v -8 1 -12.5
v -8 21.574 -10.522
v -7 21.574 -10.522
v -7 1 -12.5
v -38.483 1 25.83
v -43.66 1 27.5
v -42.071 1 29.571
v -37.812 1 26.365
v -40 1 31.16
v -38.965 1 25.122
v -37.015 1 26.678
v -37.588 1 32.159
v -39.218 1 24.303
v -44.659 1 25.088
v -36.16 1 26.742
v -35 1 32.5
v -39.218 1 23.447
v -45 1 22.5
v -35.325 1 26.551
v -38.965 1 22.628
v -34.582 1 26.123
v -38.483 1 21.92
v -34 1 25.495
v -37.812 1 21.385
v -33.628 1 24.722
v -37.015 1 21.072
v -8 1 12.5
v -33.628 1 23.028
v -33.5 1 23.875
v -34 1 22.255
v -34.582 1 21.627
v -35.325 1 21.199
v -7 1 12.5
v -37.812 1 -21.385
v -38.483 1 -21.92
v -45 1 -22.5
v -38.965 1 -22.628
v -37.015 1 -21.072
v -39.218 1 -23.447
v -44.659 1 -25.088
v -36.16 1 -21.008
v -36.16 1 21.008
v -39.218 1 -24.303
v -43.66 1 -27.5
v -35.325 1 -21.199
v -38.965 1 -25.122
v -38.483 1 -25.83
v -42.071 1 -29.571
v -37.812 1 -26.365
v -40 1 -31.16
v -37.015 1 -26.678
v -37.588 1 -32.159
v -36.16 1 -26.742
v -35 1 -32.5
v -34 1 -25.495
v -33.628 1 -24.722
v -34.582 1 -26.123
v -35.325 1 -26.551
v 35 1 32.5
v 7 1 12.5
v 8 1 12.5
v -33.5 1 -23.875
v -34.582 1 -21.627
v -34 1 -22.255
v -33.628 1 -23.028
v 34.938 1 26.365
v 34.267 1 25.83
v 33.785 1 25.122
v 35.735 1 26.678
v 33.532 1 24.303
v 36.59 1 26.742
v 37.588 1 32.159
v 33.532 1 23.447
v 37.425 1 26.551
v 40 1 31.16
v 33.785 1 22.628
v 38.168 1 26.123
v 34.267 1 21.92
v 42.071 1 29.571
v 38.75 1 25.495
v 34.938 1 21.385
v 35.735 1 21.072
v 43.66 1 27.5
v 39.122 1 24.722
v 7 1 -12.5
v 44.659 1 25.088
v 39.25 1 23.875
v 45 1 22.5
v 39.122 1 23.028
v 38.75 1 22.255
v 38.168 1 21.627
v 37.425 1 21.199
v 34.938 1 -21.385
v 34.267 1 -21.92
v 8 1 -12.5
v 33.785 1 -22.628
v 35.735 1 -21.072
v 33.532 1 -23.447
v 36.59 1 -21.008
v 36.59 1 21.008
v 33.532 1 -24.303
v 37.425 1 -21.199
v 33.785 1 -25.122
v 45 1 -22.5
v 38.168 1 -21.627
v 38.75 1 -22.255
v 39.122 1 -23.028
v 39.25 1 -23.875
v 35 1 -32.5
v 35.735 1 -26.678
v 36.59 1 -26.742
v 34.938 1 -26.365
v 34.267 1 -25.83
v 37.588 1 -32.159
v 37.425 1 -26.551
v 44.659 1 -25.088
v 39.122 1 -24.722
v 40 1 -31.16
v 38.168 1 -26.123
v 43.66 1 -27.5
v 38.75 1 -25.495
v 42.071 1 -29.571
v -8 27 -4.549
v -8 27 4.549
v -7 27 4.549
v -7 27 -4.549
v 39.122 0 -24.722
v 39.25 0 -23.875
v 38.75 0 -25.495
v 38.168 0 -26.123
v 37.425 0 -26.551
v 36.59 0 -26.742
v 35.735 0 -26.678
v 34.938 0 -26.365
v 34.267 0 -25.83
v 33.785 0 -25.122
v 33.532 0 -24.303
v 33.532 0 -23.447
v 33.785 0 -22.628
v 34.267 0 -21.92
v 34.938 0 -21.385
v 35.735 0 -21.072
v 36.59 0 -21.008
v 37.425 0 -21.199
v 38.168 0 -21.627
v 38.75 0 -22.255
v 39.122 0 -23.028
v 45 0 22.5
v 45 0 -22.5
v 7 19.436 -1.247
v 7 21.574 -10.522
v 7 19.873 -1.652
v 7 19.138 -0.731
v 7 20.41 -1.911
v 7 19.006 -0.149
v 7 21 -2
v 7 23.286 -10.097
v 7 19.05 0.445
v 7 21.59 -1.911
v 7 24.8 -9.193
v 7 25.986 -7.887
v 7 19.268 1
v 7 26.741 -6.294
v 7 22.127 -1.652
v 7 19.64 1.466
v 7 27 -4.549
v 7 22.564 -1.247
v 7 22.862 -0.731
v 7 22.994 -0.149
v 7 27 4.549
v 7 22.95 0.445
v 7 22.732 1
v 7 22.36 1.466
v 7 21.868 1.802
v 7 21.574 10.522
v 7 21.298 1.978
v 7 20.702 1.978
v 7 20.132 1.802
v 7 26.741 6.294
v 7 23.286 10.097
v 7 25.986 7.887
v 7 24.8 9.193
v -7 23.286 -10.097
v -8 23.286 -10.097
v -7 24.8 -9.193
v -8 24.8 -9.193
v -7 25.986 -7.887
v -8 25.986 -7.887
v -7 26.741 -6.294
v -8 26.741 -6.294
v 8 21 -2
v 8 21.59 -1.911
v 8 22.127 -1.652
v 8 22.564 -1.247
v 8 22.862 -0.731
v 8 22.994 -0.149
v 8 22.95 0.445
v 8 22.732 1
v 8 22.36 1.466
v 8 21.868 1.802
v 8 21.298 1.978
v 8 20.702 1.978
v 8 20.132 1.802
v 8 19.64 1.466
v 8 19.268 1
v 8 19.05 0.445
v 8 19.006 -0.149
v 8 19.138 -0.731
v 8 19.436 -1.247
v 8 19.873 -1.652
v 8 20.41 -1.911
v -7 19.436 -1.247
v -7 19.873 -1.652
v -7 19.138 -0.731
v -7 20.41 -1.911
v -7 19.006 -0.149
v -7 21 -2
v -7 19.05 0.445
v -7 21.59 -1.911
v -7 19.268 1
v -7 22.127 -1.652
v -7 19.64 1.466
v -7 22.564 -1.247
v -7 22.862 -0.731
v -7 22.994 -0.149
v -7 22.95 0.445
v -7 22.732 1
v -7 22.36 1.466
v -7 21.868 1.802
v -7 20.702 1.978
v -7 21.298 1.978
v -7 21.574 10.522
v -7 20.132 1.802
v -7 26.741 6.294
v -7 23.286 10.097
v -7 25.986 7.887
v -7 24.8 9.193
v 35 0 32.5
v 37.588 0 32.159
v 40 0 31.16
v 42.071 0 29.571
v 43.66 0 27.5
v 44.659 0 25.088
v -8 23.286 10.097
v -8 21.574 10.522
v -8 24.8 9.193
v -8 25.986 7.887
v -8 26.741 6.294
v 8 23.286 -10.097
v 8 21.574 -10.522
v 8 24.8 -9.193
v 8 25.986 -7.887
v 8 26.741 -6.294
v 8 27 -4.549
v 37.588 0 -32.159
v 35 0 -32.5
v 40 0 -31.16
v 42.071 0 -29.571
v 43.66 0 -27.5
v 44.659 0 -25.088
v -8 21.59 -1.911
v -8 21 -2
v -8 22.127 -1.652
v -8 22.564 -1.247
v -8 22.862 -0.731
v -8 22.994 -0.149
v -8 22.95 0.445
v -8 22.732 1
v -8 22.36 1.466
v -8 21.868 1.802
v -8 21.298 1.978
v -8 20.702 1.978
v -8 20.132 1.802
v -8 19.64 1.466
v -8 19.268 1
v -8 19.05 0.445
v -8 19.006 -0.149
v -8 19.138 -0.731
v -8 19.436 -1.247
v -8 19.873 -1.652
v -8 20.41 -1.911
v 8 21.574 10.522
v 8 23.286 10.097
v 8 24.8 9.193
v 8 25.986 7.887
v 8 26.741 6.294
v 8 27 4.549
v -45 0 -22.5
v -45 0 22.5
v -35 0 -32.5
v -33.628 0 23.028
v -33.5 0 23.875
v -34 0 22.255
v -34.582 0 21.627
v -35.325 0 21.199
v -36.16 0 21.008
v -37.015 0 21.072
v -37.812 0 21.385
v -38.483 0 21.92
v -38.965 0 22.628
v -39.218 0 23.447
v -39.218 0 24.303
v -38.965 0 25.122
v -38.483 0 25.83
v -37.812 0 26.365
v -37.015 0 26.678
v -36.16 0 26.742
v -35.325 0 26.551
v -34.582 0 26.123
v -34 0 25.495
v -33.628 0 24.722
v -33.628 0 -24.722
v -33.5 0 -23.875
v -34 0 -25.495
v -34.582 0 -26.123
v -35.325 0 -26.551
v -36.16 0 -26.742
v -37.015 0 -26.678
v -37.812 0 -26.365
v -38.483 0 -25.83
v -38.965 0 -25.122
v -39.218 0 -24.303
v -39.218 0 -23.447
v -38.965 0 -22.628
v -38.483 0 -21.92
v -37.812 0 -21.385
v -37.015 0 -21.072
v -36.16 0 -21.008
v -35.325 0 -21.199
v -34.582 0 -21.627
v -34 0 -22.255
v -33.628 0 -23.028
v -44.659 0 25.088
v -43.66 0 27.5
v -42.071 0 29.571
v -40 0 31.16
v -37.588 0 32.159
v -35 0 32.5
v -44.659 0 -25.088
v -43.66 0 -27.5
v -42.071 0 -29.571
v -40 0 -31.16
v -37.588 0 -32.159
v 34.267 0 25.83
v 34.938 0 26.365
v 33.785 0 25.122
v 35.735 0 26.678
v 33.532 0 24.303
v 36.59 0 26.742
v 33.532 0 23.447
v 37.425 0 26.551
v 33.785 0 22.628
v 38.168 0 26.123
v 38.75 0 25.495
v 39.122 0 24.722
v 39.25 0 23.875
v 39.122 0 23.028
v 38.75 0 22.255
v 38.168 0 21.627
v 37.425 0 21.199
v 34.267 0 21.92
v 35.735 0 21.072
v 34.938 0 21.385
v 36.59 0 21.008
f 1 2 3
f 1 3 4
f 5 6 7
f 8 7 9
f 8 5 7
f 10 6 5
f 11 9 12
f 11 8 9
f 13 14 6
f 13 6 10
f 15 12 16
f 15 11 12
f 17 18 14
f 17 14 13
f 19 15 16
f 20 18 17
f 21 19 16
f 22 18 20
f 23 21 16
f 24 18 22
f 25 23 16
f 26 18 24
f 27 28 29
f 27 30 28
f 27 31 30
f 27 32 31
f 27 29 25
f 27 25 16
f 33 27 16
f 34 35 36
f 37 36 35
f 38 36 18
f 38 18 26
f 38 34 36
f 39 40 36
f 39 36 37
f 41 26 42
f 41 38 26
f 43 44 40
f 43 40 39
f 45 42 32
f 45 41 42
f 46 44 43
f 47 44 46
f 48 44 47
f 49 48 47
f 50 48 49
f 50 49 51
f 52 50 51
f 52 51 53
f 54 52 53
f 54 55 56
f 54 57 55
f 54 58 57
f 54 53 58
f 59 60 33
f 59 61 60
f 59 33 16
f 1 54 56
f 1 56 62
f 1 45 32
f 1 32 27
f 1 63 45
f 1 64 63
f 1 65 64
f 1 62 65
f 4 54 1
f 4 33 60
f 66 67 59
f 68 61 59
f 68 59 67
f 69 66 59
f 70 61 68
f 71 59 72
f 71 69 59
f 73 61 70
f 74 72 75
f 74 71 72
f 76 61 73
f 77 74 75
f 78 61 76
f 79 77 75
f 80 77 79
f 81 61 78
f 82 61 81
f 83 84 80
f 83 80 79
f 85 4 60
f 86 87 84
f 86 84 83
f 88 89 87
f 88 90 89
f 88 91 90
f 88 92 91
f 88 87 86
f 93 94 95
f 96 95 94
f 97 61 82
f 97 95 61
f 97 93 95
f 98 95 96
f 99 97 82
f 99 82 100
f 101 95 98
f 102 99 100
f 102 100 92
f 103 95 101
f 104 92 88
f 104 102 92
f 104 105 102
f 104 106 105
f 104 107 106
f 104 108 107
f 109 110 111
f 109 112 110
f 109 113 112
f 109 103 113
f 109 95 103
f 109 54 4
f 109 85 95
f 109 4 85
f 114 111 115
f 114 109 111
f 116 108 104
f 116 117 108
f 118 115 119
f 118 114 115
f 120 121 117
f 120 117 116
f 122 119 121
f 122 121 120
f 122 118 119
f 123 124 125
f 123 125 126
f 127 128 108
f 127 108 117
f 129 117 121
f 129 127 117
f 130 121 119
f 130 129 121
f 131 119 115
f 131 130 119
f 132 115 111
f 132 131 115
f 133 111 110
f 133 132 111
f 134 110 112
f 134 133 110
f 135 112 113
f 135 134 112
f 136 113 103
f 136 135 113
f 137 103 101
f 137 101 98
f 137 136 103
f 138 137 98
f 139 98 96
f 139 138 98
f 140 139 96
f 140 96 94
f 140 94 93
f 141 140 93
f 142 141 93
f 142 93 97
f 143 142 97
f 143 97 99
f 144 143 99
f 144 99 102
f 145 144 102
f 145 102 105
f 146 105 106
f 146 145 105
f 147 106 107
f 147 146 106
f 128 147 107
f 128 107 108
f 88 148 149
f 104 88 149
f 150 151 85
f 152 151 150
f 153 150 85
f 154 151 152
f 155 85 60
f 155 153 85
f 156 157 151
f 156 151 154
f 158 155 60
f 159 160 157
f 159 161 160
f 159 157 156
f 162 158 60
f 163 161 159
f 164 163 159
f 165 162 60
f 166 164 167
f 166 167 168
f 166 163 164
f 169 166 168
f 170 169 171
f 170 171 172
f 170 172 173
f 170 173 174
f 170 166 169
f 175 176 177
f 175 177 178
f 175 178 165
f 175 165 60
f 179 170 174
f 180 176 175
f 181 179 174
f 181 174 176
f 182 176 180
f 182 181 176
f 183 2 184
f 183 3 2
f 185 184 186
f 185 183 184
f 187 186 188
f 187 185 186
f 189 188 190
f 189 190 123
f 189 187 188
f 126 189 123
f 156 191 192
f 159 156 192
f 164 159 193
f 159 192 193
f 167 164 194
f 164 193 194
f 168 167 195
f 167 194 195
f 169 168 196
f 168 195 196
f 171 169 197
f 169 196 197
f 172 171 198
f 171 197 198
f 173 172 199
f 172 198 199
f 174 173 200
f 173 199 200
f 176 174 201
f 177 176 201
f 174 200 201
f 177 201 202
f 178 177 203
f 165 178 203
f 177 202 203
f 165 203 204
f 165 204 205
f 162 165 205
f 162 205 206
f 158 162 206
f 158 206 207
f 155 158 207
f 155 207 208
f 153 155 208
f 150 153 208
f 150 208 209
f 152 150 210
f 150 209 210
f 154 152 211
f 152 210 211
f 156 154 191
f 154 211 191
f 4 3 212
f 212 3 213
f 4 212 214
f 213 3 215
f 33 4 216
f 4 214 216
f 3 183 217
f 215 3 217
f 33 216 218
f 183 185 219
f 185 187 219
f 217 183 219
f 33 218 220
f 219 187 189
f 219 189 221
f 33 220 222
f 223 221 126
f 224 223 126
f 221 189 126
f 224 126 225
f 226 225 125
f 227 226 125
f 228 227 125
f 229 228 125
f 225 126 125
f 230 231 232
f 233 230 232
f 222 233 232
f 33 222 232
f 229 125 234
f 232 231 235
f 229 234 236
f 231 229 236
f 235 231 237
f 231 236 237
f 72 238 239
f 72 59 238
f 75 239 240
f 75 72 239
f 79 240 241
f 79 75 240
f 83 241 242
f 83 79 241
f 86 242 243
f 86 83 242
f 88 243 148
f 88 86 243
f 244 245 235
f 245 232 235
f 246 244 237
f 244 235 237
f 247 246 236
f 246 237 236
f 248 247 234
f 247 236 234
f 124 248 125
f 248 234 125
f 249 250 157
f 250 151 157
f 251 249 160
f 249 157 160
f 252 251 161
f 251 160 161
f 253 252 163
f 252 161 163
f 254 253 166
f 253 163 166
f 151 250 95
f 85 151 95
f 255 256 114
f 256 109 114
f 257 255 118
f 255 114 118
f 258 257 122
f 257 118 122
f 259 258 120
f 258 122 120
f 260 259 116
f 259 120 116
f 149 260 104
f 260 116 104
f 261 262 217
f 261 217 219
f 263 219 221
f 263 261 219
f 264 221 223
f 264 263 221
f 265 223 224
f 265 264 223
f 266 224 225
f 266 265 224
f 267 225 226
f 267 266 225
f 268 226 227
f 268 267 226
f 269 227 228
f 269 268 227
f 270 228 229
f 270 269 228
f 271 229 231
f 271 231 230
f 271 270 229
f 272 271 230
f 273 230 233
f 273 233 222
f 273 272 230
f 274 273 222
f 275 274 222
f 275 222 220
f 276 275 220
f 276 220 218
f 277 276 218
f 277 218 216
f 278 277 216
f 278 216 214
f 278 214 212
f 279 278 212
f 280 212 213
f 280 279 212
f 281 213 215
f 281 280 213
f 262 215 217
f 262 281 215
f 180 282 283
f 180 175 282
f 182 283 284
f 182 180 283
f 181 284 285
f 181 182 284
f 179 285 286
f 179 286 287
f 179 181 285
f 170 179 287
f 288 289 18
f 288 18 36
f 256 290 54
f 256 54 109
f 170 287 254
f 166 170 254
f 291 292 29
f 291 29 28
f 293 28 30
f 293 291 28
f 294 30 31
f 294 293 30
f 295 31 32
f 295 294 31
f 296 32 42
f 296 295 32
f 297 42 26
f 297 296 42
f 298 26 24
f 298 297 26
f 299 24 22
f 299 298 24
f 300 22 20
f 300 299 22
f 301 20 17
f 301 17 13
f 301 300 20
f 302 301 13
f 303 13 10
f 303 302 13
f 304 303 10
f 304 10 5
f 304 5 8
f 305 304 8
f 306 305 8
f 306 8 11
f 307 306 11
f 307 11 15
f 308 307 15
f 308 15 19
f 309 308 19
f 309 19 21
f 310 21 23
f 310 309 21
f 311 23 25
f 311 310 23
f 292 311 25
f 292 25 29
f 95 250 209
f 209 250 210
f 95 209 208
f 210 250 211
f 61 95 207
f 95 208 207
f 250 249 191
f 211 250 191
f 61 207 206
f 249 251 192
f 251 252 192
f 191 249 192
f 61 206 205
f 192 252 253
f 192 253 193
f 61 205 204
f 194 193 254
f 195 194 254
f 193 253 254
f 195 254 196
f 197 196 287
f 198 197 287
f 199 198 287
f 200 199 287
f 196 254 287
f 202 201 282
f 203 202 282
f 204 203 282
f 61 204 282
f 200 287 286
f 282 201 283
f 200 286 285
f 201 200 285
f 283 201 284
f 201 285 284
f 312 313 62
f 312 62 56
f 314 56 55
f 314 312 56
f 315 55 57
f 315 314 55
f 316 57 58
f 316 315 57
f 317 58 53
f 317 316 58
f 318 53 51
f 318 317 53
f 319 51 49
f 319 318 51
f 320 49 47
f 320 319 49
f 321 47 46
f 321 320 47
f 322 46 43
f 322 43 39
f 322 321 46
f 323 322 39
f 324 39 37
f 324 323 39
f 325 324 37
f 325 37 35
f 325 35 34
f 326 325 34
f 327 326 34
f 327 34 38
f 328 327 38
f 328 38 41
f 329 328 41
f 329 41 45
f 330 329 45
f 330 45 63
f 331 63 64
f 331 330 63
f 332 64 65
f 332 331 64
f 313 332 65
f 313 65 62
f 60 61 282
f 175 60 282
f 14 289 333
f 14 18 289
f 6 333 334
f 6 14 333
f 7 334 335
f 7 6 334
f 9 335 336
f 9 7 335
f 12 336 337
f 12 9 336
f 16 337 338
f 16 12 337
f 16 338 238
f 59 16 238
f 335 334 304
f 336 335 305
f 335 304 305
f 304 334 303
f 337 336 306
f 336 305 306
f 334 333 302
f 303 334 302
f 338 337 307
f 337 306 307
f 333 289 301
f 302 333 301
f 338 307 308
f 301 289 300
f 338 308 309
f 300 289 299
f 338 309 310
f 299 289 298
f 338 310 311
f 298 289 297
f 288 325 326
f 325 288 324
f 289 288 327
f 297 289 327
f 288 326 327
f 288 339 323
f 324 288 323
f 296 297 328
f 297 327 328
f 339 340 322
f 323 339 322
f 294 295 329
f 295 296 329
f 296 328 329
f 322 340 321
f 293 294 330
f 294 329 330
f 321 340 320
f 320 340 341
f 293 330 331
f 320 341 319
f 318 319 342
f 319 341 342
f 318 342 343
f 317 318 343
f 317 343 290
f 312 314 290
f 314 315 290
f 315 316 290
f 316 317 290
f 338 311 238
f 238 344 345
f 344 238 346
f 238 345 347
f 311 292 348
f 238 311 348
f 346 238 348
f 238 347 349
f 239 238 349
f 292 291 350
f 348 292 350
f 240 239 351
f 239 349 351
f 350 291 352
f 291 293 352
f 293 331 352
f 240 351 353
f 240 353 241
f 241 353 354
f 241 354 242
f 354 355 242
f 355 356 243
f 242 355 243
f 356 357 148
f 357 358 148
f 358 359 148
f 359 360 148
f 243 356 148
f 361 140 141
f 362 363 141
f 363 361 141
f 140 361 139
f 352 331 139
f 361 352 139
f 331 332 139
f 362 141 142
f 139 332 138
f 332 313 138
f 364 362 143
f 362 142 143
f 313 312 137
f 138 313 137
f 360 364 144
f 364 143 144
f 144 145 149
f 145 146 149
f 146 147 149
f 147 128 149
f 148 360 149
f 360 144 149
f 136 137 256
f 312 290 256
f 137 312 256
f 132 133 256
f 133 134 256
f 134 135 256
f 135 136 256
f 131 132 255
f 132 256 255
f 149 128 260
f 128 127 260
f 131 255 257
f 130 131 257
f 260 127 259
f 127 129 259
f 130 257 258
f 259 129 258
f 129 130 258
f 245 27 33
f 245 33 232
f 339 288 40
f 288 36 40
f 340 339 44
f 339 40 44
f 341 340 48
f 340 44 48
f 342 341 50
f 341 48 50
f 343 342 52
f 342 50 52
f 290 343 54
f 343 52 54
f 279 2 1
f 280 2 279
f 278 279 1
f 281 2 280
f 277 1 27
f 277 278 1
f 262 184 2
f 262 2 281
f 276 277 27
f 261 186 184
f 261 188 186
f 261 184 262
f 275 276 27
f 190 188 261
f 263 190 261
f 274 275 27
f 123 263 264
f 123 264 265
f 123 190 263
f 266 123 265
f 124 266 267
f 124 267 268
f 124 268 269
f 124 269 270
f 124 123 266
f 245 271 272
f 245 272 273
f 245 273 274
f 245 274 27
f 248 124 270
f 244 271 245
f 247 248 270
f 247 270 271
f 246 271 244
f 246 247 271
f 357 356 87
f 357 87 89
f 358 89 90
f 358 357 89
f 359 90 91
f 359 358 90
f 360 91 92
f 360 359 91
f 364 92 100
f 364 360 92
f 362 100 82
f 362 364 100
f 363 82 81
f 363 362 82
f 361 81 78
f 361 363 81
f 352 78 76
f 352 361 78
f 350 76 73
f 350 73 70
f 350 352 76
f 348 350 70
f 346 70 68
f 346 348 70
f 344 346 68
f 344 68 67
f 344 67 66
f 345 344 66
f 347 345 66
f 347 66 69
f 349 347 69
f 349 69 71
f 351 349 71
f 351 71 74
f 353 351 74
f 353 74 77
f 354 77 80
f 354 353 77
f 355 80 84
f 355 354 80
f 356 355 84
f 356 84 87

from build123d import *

# Parameters (mm, degrees)
SKETCH1_W            = 90
SKETCH1_H            = 65
SKETCH1_R            = 2.875
BOSS_EXTRUDE1_DEPTH  = 1
FILLET1_R            = 10
BOSS_EXTRUDE2_START  = -37
SKETCH2_R            = 2
BOSS_EXTRUDE2_DEPTH  = 1
FILLET2_R            = 6
FILLET2_OF_MIRROR1_R = 6


with BuildPart() as part:
    # Sketch1 → Boss-Extrude1 (new body)
    with BuildSketch(Plane(origin=(0, 0, 0), x_dir=(1, 0, 0), z_dir=(0, 1, 0))):
        Rectangle(SKETCH1_W, SKETCH1_H)
        with Locations((-36.375, 23.875)):
            Circle(SKETCH1_R, mode=Mode.SUBTRACT)
        with Locations((36.375, 23.875)):
            Circle(SKETCH1_R, mode=Mode.SUBTRACT)
        with Locations((36.375, -23.875)):
            Circle(SKETCH1_R, mode=Mode.SUBTRACT)
        with Locations((-36.375, -23.875)):
            Circle(SKETCH1_R, mode=Mode.SUBTRACT)
    extrude(amount=BOSS_EXTRUDE1_DEPTH)

    # Fillet1
    fillet1_edges = [part.edges().sort_by_distance(p)[0] for p in [
        (45, 0.5, 32.5),
        (-45, 0.5, 32.5),
        (-45, 0.5, -32.5),
        (45, 0.5, -32.5),
    ]]
    fillet(fillet1_edges, radius=FILLET1_R)

    # Sketch2 → Boss-Extrude2 (add)
    with BuildSketch(Plane(origin=(45, 0, 0), x_dir=(0, 0, -1), z_dir=(1, 0, 0)).offset(BOSS_EXTRUDE2_START)):
        Polygon((-12.5, 1), (-10, 27), (10, 27), (12.5, 1), align=None)
        with Locations((0, 21)):
            Circle(SKETCH2_R, mode=Mode.SUBTRACT)
    boss_extrude2 = extrude(amount=-BOSS_EXTRUDE2_DEPTH)

    # Fillet2
    fillet2_edges = [part.edges().sort_by_distance(p)[0] for p in [
        (7.5, 27, 10),
        (7.5, 27, -10),
    ]]
    fillet(fillet2_edges, radius=FILLET2_R)

    # Mirror1: Boss-Extrude2 across plane
    add(boss_extrude2.mirror(Plane.ZY))

    # Fillet2 of Mirror1
    fillet2_of_mirror1_edges = [part.edges().sort_by_distance(p)[0] for p in [
        (-7.5, 27, 10),
        (-7.5, 27, -10),
    ]]
    fillet(fillet2_of_mirror1_edges, radius=FILLET2_OF_MIRROR1_R)


solid = part.part
